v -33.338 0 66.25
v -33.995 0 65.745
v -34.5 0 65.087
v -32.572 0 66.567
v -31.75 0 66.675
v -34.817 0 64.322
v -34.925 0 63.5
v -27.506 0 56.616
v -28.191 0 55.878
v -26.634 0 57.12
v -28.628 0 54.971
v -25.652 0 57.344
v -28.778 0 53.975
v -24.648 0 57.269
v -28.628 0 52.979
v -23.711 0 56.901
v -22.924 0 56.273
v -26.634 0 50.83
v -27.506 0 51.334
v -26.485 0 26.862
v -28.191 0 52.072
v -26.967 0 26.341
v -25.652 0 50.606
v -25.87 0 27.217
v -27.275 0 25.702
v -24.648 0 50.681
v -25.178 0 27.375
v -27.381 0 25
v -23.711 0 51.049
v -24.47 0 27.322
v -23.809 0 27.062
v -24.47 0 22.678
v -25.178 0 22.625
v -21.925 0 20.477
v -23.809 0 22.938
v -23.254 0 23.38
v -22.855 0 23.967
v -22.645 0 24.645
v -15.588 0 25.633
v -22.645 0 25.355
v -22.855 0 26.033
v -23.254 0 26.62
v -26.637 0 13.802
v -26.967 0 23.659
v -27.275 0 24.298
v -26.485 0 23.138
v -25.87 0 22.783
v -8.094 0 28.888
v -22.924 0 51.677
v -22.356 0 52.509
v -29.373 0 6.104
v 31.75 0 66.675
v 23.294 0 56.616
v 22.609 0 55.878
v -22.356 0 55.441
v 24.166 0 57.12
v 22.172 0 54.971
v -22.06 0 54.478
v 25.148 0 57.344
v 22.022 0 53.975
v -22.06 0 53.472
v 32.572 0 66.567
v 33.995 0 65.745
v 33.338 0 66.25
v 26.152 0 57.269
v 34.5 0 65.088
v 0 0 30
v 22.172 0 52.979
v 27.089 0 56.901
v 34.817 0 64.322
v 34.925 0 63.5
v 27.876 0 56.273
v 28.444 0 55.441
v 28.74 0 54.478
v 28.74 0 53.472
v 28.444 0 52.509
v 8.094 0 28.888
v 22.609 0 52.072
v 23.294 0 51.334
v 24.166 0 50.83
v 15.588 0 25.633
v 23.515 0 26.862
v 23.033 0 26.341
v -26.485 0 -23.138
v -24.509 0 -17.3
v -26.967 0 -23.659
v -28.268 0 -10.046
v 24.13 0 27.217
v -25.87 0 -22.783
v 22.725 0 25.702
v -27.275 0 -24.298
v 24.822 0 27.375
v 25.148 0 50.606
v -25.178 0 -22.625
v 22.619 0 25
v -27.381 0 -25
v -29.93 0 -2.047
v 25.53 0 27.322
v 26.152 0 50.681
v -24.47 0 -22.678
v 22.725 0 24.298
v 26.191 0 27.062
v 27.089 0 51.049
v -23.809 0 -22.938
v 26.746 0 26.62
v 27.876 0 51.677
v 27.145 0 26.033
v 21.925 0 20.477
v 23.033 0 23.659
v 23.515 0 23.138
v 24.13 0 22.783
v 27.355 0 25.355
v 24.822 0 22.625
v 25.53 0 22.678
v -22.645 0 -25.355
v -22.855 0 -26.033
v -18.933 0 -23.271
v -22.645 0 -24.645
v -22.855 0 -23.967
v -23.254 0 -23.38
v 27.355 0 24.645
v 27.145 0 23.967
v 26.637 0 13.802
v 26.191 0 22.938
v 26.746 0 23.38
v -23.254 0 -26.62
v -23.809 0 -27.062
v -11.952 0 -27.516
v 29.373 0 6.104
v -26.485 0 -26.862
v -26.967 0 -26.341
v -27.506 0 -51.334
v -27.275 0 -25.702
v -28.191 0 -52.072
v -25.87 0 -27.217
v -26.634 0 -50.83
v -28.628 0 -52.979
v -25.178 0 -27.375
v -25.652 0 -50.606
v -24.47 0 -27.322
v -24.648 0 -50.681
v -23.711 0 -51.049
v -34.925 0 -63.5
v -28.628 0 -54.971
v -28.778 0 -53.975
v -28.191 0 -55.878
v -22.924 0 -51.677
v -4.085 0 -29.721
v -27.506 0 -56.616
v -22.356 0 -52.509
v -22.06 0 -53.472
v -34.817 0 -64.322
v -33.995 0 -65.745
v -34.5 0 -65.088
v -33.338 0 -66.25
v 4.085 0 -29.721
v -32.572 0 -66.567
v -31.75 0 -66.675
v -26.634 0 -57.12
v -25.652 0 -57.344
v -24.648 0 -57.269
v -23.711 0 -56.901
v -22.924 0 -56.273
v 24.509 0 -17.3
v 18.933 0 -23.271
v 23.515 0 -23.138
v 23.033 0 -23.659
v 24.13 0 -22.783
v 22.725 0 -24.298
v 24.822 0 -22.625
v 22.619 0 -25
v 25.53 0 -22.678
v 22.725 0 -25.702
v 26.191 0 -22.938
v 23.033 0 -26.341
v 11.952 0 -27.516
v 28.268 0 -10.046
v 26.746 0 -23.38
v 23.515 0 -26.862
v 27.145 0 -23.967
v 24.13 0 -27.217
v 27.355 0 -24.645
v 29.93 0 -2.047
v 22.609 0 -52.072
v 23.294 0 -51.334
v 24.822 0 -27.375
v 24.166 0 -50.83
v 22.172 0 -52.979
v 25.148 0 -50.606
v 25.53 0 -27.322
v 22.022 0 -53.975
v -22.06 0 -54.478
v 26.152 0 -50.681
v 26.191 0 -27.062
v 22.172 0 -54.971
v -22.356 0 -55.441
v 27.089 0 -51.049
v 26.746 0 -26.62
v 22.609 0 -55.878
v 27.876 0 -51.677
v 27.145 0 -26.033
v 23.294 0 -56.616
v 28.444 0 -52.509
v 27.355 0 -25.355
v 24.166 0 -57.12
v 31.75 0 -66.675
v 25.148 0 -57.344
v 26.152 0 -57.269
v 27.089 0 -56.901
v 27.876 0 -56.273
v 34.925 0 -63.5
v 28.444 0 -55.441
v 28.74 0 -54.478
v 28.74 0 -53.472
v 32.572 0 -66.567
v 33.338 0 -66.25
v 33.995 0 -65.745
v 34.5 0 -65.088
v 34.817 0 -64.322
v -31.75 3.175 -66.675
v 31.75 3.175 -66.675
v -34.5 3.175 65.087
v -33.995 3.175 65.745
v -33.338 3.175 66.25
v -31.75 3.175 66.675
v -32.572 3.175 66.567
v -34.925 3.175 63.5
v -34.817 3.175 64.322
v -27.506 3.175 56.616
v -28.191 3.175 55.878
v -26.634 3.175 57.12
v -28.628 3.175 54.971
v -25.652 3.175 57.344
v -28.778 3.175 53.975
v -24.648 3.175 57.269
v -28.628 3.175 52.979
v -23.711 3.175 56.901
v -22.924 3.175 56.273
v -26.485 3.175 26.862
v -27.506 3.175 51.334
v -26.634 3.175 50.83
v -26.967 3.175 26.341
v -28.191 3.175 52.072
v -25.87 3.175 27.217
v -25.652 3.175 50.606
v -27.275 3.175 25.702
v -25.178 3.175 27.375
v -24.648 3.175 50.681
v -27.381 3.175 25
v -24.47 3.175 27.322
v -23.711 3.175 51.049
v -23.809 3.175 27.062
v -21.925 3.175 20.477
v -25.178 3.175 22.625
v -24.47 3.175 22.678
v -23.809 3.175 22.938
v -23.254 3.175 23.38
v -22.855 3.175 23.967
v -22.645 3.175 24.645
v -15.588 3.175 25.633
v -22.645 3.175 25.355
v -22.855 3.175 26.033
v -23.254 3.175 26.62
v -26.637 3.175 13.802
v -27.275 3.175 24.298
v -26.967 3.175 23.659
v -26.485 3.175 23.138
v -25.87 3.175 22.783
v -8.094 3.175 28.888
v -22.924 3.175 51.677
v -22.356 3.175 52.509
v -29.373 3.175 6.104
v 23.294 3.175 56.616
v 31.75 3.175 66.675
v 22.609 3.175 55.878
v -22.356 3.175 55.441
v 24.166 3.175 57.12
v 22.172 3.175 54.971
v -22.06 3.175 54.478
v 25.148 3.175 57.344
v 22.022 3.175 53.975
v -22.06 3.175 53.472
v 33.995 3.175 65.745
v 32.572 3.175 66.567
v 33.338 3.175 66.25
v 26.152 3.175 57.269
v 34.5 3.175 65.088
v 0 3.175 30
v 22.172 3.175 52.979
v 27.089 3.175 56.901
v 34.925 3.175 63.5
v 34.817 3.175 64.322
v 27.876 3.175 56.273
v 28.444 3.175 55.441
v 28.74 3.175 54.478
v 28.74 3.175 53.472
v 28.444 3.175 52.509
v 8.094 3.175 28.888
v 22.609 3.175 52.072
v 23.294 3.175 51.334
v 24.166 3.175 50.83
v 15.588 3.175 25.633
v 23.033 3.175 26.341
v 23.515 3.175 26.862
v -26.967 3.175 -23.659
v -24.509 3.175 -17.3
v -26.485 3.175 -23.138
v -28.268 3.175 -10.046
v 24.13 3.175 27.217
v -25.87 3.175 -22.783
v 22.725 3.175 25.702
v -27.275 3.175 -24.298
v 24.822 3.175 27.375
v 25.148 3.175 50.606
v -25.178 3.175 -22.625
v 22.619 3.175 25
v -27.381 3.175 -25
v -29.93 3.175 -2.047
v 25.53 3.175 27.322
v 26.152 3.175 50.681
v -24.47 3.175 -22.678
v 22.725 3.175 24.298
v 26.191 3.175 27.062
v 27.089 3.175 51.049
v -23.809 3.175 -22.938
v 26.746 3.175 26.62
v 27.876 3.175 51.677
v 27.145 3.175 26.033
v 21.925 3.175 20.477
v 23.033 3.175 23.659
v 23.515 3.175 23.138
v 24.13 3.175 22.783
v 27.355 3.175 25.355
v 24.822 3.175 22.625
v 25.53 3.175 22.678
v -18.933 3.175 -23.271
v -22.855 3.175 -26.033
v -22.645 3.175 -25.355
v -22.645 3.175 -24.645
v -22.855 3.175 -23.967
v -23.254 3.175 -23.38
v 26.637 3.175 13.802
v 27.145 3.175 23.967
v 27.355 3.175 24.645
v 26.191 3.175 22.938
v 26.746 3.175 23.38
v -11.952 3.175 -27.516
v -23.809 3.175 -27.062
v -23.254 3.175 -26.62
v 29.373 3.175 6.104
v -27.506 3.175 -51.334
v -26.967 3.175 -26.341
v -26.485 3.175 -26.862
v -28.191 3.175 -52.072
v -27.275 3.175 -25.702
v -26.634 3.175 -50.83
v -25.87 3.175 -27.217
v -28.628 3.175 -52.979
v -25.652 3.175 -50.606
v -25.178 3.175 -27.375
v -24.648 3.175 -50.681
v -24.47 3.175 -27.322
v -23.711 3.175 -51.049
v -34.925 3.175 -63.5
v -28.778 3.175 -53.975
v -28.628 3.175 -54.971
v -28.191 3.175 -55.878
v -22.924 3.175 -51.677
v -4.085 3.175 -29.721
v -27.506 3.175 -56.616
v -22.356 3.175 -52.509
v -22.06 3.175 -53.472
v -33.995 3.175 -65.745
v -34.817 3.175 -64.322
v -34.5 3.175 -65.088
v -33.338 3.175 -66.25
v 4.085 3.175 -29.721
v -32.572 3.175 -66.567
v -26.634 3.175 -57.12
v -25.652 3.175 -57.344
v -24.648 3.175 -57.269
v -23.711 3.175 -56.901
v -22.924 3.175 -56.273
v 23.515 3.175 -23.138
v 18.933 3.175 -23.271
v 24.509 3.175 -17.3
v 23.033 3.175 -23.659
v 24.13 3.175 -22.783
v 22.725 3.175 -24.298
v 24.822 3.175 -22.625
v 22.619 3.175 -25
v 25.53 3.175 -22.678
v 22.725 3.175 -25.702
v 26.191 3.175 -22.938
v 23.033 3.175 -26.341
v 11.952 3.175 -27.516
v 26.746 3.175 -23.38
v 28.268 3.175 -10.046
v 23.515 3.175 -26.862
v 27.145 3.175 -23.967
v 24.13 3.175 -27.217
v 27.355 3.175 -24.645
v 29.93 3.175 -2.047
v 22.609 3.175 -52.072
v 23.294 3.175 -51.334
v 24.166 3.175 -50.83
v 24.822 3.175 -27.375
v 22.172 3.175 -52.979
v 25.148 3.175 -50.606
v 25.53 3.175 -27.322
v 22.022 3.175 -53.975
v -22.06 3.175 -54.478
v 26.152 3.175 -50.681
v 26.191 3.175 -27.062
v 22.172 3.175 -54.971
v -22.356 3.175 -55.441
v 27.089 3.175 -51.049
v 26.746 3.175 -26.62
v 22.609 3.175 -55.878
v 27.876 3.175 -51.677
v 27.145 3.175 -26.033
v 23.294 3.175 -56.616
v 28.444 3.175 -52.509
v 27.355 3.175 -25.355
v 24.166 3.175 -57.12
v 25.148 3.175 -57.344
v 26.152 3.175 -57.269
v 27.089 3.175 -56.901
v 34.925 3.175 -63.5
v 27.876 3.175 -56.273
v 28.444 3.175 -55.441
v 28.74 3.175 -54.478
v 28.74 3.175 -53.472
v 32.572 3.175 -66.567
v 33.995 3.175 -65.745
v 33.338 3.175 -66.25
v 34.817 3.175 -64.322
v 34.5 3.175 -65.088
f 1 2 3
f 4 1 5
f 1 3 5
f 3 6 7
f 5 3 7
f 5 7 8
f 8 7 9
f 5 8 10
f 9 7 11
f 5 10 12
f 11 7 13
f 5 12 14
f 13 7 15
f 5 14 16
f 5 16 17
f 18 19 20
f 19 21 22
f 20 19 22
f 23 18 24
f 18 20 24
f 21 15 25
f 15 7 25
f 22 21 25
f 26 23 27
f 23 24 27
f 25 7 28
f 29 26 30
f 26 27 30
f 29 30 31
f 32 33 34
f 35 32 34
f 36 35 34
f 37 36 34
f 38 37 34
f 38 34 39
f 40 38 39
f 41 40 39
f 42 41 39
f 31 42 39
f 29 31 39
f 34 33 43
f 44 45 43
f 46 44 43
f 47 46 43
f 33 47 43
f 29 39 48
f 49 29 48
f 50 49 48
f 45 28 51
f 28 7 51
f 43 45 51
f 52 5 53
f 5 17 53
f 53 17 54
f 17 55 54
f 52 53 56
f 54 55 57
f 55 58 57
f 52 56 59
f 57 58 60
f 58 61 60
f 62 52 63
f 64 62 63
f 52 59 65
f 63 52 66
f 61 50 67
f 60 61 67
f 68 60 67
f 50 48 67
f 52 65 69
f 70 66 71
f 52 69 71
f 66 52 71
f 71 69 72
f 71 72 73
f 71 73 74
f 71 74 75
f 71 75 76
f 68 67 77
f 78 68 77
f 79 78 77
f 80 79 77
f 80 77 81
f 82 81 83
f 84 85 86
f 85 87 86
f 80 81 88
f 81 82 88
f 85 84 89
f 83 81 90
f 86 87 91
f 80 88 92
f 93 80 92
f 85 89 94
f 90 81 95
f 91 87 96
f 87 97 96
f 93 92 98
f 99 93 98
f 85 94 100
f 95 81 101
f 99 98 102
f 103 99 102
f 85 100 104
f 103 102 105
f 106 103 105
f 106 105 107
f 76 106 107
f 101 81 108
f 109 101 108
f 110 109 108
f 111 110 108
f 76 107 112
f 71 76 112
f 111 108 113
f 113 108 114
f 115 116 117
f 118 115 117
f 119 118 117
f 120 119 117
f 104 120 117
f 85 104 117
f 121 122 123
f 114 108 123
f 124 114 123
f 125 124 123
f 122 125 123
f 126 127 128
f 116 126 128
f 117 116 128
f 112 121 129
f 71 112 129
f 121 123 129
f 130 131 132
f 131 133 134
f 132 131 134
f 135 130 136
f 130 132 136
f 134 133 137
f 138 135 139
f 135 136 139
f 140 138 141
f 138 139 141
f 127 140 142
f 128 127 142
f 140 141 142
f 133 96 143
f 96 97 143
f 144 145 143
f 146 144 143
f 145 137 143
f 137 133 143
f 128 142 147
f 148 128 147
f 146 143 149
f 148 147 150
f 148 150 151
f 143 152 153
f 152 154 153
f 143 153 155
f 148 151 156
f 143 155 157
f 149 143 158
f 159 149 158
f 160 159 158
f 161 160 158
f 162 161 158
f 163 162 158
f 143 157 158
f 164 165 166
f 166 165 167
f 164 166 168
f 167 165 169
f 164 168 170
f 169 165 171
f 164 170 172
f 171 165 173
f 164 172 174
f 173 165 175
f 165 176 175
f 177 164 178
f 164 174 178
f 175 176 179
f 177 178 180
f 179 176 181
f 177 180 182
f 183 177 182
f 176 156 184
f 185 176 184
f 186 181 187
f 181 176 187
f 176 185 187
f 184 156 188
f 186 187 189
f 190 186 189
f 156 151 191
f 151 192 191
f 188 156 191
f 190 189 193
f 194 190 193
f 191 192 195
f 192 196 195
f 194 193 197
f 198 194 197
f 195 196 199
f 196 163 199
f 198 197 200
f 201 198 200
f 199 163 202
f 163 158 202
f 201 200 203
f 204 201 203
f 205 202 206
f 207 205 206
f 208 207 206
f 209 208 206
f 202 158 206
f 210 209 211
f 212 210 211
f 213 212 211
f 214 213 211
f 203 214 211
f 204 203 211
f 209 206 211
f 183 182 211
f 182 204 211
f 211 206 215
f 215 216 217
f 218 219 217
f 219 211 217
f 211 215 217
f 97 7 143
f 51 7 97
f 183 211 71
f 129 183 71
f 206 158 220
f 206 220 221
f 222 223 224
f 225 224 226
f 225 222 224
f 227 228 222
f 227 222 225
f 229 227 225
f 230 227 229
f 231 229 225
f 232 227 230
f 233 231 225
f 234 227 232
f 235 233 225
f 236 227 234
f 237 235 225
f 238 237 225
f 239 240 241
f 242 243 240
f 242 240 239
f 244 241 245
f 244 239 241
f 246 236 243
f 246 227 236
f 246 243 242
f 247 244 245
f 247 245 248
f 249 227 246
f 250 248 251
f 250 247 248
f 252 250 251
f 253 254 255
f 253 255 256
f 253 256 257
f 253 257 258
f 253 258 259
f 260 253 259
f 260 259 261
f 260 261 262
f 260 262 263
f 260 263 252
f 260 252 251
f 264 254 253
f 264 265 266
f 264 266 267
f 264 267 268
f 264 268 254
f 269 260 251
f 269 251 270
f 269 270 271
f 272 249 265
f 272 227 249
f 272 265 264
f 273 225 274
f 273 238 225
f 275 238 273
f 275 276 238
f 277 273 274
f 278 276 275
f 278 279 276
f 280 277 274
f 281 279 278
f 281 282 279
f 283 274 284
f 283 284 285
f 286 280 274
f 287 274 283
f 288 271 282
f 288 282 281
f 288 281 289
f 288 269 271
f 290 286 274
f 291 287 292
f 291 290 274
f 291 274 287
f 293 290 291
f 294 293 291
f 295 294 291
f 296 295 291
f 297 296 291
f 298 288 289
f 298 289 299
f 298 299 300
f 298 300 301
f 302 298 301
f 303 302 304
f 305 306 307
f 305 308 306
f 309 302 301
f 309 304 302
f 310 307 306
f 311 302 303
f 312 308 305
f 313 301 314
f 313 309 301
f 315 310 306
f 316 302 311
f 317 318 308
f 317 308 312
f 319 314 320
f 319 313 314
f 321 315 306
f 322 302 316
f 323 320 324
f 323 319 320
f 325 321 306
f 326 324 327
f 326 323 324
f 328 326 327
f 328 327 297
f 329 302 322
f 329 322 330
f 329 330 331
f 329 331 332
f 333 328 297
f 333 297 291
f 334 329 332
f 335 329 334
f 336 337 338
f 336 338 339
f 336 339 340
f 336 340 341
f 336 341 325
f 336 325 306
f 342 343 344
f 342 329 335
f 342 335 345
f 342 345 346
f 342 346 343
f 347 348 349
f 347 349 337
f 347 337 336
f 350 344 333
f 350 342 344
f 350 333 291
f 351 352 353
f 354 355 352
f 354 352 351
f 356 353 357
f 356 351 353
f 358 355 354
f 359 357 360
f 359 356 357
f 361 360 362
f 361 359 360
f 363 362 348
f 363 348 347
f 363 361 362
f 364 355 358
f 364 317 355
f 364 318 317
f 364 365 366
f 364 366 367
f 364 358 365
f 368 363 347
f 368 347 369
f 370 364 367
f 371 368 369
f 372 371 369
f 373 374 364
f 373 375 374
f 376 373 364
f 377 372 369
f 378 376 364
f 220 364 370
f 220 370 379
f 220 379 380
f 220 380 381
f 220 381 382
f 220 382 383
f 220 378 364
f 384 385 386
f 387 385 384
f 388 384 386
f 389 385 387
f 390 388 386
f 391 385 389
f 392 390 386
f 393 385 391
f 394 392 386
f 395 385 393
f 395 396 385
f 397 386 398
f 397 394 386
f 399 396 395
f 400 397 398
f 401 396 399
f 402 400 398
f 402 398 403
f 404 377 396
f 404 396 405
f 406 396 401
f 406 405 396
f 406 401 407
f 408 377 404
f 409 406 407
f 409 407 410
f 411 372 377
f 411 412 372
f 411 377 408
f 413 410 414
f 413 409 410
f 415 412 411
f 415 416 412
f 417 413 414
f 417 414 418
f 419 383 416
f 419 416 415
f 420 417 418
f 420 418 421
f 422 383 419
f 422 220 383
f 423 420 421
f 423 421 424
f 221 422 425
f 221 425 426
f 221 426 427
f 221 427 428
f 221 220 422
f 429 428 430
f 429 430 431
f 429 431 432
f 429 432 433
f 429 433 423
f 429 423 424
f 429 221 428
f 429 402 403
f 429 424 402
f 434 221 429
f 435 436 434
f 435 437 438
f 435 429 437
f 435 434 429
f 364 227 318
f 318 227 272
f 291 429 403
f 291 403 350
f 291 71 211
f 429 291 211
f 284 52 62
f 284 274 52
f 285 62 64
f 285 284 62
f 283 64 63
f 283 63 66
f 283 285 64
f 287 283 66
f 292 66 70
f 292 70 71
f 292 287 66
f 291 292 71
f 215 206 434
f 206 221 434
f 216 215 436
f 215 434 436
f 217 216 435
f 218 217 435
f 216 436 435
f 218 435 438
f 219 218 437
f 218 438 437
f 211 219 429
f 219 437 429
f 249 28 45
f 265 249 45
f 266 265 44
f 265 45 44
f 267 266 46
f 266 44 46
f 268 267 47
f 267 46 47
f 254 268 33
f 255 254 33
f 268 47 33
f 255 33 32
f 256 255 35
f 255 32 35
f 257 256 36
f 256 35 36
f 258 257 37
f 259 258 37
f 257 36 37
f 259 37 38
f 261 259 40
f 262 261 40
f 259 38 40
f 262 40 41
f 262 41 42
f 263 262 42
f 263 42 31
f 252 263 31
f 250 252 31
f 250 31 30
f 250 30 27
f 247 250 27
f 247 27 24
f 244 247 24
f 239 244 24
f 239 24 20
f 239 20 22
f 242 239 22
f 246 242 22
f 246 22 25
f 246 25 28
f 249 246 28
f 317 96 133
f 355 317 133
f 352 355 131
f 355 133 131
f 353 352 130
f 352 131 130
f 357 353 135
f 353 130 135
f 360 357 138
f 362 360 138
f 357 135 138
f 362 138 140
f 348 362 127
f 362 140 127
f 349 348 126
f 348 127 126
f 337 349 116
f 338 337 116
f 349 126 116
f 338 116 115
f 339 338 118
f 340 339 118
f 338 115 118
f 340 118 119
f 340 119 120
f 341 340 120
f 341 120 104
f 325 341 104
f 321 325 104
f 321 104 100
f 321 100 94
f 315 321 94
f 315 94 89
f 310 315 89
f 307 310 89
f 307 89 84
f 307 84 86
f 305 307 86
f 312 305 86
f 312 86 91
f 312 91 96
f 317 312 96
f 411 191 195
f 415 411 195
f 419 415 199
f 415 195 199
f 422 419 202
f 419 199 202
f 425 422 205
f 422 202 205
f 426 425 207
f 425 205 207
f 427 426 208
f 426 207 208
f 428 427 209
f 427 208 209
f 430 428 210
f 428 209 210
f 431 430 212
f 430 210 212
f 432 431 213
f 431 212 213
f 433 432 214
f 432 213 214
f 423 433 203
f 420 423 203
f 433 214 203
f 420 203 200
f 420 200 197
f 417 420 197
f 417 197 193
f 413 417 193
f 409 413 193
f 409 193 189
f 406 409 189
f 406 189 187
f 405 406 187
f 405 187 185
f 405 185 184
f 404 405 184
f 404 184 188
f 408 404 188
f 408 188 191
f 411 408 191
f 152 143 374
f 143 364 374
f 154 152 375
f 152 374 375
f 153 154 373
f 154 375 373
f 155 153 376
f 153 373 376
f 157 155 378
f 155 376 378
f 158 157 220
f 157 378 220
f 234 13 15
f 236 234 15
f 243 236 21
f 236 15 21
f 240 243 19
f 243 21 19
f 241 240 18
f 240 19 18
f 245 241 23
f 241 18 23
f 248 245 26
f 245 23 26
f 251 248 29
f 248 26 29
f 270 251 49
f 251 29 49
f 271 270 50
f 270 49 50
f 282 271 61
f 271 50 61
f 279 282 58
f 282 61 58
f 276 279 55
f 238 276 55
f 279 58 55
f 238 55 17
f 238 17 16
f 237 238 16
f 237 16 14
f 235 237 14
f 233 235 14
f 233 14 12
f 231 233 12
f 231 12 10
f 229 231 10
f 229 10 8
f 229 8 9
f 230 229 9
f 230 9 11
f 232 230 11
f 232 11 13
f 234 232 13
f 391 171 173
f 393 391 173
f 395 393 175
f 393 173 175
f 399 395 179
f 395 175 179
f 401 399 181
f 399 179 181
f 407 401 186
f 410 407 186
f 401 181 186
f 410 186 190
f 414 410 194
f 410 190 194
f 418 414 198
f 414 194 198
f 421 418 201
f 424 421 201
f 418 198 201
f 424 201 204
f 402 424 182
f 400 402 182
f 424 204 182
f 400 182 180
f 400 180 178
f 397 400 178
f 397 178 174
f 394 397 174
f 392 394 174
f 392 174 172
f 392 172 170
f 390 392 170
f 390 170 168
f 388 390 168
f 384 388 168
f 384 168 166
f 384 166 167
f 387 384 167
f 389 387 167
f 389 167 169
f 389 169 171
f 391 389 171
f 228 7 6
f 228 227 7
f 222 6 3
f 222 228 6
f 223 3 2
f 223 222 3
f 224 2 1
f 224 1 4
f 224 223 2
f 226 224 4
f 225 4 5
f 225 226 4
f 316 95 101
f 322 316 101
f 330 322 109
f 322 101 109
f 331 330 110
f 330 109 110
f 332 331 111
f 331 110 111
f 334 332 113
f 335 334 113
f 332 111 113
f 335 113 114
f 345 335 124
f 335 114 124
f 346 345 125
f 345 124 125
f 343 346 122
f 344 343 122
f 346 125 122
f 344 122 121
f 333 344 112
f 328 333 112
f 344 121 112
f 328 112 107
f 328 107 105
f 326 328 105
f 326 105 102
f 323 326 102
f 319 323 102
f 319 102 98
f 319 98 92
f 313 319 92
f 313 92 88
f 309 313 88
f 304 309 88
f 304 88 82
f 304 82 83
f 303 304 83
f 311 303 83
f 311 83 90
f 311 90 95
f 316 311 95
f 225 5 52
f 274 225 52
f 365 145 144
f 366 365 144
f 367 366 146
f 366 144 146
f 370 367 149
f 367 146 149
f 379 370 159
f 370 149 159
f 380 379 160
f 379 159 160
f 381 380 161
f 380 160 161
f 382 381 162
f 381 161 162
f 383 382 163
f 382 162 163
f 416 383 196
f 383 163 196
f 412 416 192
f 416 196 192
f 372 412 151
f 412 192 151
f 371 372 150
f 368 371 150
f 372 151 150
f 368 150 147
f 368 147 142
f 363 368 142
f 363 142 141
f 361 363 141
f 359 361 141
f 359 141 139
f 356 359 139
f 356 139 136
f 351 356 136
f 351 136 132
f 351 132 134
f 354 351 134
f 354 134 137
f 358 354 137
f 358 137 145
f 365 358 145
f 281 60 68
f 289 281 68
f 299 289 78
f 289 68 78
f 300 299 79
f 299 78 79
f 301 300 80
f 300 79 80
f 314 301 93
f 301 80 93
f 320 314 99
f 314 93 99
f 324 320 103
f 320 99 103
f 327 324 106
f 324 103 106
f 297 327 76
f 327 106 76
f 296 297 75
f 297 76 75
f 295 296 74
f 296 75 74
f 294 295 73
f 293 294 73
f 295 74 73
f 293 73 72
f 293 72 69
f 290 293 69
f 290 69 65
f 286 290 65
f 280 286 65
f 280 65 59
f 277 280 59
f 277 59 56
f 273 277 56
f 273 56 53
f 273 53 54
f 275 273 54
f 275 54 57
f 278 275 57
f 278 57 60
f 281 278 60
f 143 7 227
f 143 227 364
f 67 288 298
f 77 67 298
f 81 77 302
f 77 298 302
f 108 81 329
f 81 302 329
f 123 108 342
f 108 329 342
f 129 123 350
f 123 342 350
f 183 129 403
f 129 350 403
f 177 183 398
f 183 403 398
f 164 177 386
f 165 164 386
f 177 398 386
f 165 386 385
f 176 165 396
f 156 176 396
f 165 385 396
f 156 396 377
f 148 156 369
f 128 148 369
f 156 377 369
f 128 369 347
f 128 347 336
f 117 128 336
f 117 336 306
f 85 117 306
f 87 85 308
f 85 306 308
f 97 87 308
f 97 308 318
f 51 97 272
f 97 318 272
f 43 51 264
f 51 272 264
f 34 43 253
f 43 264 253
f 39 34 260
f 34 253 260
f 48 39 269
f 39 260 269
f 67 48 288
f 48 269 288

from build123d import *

# Parameters (mm, degrees)
SKETCH1_W                      = 69.85
SKETCH1_H                      = 133.35
BOSS_EXTRUDE1_DEPTH            = 3.175
SKETCH2_R                      = 30
CUT_EXTRUDE1_DEPTH             = 3.175
F_3_16_0_1875_DIAMETER_HOLE1_D = 4.7625
F_1_4_CLEARANCE_HOLE1_D        = 6.7564
F_1_4_CLEARANCE_HOLE1_DEPTH    = 3.175
FILLET1_R                      = 3.175


with BuildPart() as part:
    # Sketch1 → Boss-Extrude1 (new body)
    with BuildSketch(Plane(origin=(0, 0, 0), x_dir=(1, 0, 0), z_dir=(0, 1, 0))):
        Rectangle(SKETCH1_W, SKETCH1_H)
    extrude(amount=BOSS_EXTRUDE1_DEPTH)

    # Sketch2 → Cut-Extrude1 (cut)
    with BuildSketch(Plane(origin=(0, 3.175, 0), x_dir=(1, 0, 0), z_dir=(0, 1, 0))):
        with Locations(Location((0, 0, 0), (0, 0, 270))):
            Circle(SKETCH2_R)
    extrude(amount=-CUT_EXTRUDE1_DEPTH, mode=Mode.SUBTRACT)

    # 3/16 (0.1875) Diameter Hole1 (through all)
    with Locations(Plane(origin=(0, 3.175, 0), x_dir=(1, 0, 0), z_dir=(0, 1, 0))):
        with Locations((25, -25), (25, 25), (-25, -25), (-25, 25)):
            Hole(F_3_16_0_1875_DIAMETER_HOLE1_D / 2)

    # 1/4 Clearance Hole1
    with Locations(Plane(origin=(0, 3.175, 0), x_dir=(1, 0, 0), z_dir=(0, 1, 0))):
        with Locations((0, 0), (25.4, 53.975), (-25.4, -53.975), (-25.4, 53.975), (25.4, -53.975)):
            Hole(F_1_4_CLEARANCE_HOLE1_D / 2, depth=F_1_4_CLEARANCE_HOLE1_DEPTH)

    # Fillet1
    fillet1_edges = [part.edges().sort_by_distance(p)[0] for p in [
        (34.925, 1.5875, 66.675),
        (-34.925, 1.5875, 66.675),
        (-34.925, 1.5875, -66.675),
        (34.925, 1.5875, -66.675),
    ]]
    fillet(fillet1_edges, radius=FILLET1_R)


solid = part.part
